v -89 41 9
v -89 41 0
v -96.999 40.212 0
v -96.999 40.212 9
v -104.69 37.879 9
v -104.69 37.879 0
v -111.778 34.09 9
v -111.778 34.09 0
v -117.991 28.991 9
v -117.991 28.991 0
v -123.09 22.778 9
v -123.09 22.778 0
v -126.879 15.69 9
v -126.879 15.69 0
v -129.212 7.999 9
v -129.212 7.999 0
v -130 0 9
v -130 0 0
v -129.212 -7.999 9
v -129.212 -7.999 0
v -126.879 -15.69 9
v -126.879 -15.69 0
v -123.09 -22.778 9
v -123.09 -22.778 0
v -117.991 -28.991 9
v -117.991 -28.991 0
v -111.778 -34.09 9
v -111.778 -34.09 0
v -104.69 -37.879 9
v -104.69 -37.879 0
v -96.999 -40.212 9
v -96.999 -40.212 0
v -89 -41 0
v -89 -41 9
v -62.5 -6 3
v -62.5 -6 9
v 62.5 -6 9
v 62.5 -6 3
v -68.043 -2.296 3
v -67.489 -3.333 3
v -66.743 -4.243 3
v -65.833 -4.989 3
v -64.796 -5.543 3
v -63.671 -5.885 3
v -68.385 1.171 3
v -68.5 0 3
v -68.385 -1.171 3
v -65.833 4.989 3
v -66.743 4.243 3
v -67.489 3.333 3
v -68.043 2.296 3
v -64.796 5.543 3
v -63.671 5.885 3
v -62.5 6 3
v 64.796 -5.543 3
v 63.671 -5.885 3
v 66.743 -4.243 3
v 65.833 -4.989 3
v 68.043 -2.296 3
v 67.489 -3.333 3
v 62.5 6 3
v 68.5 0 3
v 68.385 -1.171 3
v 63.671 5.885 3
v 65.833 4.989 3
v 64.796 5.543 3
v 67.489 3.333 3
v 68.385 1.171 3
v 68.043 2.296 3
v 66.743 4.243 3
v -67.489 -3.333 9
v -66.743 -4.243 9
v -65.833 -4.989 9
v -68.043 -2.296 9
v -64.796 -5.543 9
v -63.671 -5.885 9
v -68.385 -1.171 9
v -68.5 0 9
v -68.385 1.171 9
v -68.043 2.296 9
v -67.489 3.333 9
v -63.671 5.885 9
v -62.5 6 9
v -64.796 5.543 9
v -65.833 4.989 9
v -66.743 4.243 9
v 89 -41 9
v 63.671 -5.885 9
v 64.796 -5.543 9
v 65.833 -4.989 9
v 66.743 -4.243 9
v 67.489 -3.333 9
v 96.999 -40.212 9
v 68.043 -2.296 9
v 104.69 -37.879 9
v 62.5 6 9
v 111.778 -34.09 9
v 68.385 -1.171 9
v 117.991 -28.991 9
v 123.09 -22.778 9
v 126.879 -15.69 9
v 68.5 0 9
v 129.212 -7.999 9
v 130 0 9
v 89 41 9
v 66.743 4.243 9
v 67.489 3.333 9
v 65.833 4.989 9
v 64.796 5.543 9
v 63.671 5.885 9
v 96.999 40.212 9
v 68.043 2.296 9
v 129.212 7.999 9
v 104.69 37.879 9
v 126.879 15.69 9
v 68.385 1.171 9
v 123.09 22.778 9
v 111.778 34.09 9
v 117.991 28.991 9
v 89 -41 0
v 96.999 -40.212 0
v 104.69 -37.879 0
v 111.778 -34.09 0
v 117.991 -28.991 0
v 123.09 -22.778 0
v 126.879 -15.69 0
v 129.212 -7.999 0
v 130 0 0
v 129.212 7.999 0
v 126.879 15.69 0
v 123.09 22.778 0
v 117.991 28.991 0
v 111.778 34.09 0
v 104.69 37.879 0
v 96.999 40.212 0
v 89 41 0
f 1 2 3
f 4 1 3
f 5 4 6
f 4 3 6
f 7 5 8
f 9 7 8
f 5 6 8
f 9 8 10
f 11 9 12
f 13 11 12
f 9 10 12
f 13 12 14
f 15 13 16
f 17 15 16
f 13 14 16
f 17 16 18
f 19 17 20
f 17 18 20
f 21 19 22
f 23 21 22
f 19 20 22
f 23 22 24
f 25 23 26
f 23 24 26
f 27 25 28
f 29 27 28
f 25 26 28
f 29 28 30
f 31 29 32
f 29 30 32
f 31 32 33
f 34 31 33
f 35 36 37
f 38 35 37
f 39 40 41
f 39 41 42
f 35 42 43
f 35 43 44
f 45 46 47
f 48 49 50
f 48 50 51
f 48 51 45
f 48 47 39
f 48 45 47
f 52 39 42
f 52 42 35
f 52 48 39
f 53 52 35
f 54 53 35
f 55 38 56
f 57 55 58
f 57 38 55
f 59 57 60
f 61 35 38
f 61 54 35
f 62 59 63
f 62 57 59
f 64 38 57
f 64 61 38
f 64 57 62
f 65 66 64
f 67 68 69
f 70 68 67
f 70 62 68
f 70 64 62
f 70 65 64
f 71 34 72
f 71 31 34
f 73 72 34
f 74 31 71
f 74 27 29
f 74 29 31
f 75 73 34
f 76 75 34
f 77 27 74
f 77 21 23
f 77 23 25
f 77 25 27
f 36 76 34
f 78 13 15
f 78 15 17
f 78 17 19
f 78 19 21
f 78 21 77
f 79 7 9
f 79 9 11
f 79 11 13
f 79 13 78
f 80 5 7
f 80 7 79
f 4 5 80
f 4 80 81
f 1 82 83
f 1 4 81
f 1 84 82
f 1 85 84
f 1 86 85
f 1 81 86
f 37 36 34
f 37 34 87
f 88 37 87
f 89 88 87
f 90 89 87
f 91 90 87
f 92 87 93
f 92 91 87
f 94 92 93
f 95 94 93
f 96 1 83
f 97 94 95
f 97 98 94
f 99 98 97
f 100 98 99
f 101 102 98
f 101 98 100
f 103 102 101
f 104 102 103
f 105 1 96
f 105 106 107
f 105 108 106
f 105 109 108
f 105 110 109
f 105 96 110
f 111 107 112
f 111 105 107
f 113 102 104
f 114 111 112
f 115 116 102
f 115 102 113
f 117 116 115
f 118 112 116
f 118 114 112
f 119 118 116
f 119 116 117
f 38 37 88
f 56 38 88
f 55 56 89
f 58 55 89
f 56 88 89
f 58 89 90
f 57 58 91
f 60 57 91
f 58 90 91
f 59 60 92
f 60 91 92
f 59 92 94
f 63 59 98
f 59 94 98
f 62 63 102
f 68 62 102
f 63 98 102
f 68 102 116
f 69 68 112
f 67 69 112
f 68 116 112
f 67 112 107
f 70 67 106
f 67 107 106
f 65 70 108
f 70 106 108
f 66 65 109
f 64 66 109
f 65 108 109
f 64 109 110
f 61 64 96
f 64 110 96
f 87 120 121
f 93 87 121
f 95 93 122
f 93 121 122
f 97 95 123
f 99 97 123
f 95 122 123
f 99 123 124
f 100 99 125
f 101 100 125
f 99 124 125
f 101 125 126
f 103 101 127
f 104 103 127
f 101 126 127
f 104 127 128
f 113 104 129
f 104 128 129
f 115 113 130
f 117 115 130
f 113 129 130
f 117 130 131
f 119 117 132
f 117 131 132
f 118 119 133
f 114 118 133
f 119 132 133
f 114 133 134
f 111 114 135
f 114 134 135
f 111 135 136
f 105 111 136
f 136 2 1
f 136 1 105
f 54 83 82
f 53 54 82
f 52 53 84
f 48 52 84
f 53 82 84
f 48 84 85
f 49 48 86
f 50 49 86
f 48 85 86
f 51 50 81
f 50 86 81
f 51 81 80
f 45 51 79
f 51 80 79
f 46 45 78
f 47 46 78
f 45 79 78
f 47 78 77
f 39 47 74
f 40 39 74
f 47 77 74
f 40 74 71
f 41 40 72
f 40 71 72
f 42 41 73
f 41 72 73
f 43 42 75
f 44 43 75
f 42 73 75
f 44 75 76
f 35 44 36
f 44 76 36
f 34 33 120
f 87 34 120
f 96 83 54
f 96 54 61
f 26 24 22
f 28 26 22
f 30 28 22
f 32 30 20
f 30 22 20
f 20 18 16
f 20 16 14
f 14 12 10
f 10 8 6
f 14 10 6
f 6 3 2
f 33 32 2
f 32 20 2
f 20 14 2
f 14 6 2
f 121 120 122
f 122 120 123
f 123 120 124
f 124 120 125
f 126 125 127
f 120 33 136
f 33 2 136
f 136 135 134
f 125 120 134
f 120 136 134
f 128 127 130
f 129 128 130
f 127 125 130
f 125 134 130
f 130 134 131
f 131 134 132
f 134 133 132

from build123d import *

# Parameters (mm, degrees)
PAD_DEPTH    = 9
POCKET_DEPTH = 6


with BuildPart() as part:
    # Sketch → Pad (new body)
    with BuildSketch(Plane.XY):
        with BuildLine():
            ThreePointArc((-89, 41), (-130, 0), (-89, -41))
            Line((-89, -41), (89, -41))
            ThreePointArc((89, -41), (130, 0), (89, 41))
            Line((-89, 41), (89, 41))
        make_face()
    extrude(amount=PAD_DEPTH)

    # Sketch001 (on Face6 of Pad) → Pocket (cut)
    with BuildSketch(Plane.XY.offset(9)):
        with BuildLine():
            ThreePointArc((-62.5, 6), (-68.5, 0), (-62.5, -6))
            Line((-62.5, -6), (62.5, -6))
            ThreePointArc((62.5, -6), (68.5, 0), (62.5, 6))
            Line((-62.5, 6), (62.5, 6))
        make_face()
    extrude(amount=-POCKET_DEPTH, mode=Mode.SUBTRACT)


solid = part.part
